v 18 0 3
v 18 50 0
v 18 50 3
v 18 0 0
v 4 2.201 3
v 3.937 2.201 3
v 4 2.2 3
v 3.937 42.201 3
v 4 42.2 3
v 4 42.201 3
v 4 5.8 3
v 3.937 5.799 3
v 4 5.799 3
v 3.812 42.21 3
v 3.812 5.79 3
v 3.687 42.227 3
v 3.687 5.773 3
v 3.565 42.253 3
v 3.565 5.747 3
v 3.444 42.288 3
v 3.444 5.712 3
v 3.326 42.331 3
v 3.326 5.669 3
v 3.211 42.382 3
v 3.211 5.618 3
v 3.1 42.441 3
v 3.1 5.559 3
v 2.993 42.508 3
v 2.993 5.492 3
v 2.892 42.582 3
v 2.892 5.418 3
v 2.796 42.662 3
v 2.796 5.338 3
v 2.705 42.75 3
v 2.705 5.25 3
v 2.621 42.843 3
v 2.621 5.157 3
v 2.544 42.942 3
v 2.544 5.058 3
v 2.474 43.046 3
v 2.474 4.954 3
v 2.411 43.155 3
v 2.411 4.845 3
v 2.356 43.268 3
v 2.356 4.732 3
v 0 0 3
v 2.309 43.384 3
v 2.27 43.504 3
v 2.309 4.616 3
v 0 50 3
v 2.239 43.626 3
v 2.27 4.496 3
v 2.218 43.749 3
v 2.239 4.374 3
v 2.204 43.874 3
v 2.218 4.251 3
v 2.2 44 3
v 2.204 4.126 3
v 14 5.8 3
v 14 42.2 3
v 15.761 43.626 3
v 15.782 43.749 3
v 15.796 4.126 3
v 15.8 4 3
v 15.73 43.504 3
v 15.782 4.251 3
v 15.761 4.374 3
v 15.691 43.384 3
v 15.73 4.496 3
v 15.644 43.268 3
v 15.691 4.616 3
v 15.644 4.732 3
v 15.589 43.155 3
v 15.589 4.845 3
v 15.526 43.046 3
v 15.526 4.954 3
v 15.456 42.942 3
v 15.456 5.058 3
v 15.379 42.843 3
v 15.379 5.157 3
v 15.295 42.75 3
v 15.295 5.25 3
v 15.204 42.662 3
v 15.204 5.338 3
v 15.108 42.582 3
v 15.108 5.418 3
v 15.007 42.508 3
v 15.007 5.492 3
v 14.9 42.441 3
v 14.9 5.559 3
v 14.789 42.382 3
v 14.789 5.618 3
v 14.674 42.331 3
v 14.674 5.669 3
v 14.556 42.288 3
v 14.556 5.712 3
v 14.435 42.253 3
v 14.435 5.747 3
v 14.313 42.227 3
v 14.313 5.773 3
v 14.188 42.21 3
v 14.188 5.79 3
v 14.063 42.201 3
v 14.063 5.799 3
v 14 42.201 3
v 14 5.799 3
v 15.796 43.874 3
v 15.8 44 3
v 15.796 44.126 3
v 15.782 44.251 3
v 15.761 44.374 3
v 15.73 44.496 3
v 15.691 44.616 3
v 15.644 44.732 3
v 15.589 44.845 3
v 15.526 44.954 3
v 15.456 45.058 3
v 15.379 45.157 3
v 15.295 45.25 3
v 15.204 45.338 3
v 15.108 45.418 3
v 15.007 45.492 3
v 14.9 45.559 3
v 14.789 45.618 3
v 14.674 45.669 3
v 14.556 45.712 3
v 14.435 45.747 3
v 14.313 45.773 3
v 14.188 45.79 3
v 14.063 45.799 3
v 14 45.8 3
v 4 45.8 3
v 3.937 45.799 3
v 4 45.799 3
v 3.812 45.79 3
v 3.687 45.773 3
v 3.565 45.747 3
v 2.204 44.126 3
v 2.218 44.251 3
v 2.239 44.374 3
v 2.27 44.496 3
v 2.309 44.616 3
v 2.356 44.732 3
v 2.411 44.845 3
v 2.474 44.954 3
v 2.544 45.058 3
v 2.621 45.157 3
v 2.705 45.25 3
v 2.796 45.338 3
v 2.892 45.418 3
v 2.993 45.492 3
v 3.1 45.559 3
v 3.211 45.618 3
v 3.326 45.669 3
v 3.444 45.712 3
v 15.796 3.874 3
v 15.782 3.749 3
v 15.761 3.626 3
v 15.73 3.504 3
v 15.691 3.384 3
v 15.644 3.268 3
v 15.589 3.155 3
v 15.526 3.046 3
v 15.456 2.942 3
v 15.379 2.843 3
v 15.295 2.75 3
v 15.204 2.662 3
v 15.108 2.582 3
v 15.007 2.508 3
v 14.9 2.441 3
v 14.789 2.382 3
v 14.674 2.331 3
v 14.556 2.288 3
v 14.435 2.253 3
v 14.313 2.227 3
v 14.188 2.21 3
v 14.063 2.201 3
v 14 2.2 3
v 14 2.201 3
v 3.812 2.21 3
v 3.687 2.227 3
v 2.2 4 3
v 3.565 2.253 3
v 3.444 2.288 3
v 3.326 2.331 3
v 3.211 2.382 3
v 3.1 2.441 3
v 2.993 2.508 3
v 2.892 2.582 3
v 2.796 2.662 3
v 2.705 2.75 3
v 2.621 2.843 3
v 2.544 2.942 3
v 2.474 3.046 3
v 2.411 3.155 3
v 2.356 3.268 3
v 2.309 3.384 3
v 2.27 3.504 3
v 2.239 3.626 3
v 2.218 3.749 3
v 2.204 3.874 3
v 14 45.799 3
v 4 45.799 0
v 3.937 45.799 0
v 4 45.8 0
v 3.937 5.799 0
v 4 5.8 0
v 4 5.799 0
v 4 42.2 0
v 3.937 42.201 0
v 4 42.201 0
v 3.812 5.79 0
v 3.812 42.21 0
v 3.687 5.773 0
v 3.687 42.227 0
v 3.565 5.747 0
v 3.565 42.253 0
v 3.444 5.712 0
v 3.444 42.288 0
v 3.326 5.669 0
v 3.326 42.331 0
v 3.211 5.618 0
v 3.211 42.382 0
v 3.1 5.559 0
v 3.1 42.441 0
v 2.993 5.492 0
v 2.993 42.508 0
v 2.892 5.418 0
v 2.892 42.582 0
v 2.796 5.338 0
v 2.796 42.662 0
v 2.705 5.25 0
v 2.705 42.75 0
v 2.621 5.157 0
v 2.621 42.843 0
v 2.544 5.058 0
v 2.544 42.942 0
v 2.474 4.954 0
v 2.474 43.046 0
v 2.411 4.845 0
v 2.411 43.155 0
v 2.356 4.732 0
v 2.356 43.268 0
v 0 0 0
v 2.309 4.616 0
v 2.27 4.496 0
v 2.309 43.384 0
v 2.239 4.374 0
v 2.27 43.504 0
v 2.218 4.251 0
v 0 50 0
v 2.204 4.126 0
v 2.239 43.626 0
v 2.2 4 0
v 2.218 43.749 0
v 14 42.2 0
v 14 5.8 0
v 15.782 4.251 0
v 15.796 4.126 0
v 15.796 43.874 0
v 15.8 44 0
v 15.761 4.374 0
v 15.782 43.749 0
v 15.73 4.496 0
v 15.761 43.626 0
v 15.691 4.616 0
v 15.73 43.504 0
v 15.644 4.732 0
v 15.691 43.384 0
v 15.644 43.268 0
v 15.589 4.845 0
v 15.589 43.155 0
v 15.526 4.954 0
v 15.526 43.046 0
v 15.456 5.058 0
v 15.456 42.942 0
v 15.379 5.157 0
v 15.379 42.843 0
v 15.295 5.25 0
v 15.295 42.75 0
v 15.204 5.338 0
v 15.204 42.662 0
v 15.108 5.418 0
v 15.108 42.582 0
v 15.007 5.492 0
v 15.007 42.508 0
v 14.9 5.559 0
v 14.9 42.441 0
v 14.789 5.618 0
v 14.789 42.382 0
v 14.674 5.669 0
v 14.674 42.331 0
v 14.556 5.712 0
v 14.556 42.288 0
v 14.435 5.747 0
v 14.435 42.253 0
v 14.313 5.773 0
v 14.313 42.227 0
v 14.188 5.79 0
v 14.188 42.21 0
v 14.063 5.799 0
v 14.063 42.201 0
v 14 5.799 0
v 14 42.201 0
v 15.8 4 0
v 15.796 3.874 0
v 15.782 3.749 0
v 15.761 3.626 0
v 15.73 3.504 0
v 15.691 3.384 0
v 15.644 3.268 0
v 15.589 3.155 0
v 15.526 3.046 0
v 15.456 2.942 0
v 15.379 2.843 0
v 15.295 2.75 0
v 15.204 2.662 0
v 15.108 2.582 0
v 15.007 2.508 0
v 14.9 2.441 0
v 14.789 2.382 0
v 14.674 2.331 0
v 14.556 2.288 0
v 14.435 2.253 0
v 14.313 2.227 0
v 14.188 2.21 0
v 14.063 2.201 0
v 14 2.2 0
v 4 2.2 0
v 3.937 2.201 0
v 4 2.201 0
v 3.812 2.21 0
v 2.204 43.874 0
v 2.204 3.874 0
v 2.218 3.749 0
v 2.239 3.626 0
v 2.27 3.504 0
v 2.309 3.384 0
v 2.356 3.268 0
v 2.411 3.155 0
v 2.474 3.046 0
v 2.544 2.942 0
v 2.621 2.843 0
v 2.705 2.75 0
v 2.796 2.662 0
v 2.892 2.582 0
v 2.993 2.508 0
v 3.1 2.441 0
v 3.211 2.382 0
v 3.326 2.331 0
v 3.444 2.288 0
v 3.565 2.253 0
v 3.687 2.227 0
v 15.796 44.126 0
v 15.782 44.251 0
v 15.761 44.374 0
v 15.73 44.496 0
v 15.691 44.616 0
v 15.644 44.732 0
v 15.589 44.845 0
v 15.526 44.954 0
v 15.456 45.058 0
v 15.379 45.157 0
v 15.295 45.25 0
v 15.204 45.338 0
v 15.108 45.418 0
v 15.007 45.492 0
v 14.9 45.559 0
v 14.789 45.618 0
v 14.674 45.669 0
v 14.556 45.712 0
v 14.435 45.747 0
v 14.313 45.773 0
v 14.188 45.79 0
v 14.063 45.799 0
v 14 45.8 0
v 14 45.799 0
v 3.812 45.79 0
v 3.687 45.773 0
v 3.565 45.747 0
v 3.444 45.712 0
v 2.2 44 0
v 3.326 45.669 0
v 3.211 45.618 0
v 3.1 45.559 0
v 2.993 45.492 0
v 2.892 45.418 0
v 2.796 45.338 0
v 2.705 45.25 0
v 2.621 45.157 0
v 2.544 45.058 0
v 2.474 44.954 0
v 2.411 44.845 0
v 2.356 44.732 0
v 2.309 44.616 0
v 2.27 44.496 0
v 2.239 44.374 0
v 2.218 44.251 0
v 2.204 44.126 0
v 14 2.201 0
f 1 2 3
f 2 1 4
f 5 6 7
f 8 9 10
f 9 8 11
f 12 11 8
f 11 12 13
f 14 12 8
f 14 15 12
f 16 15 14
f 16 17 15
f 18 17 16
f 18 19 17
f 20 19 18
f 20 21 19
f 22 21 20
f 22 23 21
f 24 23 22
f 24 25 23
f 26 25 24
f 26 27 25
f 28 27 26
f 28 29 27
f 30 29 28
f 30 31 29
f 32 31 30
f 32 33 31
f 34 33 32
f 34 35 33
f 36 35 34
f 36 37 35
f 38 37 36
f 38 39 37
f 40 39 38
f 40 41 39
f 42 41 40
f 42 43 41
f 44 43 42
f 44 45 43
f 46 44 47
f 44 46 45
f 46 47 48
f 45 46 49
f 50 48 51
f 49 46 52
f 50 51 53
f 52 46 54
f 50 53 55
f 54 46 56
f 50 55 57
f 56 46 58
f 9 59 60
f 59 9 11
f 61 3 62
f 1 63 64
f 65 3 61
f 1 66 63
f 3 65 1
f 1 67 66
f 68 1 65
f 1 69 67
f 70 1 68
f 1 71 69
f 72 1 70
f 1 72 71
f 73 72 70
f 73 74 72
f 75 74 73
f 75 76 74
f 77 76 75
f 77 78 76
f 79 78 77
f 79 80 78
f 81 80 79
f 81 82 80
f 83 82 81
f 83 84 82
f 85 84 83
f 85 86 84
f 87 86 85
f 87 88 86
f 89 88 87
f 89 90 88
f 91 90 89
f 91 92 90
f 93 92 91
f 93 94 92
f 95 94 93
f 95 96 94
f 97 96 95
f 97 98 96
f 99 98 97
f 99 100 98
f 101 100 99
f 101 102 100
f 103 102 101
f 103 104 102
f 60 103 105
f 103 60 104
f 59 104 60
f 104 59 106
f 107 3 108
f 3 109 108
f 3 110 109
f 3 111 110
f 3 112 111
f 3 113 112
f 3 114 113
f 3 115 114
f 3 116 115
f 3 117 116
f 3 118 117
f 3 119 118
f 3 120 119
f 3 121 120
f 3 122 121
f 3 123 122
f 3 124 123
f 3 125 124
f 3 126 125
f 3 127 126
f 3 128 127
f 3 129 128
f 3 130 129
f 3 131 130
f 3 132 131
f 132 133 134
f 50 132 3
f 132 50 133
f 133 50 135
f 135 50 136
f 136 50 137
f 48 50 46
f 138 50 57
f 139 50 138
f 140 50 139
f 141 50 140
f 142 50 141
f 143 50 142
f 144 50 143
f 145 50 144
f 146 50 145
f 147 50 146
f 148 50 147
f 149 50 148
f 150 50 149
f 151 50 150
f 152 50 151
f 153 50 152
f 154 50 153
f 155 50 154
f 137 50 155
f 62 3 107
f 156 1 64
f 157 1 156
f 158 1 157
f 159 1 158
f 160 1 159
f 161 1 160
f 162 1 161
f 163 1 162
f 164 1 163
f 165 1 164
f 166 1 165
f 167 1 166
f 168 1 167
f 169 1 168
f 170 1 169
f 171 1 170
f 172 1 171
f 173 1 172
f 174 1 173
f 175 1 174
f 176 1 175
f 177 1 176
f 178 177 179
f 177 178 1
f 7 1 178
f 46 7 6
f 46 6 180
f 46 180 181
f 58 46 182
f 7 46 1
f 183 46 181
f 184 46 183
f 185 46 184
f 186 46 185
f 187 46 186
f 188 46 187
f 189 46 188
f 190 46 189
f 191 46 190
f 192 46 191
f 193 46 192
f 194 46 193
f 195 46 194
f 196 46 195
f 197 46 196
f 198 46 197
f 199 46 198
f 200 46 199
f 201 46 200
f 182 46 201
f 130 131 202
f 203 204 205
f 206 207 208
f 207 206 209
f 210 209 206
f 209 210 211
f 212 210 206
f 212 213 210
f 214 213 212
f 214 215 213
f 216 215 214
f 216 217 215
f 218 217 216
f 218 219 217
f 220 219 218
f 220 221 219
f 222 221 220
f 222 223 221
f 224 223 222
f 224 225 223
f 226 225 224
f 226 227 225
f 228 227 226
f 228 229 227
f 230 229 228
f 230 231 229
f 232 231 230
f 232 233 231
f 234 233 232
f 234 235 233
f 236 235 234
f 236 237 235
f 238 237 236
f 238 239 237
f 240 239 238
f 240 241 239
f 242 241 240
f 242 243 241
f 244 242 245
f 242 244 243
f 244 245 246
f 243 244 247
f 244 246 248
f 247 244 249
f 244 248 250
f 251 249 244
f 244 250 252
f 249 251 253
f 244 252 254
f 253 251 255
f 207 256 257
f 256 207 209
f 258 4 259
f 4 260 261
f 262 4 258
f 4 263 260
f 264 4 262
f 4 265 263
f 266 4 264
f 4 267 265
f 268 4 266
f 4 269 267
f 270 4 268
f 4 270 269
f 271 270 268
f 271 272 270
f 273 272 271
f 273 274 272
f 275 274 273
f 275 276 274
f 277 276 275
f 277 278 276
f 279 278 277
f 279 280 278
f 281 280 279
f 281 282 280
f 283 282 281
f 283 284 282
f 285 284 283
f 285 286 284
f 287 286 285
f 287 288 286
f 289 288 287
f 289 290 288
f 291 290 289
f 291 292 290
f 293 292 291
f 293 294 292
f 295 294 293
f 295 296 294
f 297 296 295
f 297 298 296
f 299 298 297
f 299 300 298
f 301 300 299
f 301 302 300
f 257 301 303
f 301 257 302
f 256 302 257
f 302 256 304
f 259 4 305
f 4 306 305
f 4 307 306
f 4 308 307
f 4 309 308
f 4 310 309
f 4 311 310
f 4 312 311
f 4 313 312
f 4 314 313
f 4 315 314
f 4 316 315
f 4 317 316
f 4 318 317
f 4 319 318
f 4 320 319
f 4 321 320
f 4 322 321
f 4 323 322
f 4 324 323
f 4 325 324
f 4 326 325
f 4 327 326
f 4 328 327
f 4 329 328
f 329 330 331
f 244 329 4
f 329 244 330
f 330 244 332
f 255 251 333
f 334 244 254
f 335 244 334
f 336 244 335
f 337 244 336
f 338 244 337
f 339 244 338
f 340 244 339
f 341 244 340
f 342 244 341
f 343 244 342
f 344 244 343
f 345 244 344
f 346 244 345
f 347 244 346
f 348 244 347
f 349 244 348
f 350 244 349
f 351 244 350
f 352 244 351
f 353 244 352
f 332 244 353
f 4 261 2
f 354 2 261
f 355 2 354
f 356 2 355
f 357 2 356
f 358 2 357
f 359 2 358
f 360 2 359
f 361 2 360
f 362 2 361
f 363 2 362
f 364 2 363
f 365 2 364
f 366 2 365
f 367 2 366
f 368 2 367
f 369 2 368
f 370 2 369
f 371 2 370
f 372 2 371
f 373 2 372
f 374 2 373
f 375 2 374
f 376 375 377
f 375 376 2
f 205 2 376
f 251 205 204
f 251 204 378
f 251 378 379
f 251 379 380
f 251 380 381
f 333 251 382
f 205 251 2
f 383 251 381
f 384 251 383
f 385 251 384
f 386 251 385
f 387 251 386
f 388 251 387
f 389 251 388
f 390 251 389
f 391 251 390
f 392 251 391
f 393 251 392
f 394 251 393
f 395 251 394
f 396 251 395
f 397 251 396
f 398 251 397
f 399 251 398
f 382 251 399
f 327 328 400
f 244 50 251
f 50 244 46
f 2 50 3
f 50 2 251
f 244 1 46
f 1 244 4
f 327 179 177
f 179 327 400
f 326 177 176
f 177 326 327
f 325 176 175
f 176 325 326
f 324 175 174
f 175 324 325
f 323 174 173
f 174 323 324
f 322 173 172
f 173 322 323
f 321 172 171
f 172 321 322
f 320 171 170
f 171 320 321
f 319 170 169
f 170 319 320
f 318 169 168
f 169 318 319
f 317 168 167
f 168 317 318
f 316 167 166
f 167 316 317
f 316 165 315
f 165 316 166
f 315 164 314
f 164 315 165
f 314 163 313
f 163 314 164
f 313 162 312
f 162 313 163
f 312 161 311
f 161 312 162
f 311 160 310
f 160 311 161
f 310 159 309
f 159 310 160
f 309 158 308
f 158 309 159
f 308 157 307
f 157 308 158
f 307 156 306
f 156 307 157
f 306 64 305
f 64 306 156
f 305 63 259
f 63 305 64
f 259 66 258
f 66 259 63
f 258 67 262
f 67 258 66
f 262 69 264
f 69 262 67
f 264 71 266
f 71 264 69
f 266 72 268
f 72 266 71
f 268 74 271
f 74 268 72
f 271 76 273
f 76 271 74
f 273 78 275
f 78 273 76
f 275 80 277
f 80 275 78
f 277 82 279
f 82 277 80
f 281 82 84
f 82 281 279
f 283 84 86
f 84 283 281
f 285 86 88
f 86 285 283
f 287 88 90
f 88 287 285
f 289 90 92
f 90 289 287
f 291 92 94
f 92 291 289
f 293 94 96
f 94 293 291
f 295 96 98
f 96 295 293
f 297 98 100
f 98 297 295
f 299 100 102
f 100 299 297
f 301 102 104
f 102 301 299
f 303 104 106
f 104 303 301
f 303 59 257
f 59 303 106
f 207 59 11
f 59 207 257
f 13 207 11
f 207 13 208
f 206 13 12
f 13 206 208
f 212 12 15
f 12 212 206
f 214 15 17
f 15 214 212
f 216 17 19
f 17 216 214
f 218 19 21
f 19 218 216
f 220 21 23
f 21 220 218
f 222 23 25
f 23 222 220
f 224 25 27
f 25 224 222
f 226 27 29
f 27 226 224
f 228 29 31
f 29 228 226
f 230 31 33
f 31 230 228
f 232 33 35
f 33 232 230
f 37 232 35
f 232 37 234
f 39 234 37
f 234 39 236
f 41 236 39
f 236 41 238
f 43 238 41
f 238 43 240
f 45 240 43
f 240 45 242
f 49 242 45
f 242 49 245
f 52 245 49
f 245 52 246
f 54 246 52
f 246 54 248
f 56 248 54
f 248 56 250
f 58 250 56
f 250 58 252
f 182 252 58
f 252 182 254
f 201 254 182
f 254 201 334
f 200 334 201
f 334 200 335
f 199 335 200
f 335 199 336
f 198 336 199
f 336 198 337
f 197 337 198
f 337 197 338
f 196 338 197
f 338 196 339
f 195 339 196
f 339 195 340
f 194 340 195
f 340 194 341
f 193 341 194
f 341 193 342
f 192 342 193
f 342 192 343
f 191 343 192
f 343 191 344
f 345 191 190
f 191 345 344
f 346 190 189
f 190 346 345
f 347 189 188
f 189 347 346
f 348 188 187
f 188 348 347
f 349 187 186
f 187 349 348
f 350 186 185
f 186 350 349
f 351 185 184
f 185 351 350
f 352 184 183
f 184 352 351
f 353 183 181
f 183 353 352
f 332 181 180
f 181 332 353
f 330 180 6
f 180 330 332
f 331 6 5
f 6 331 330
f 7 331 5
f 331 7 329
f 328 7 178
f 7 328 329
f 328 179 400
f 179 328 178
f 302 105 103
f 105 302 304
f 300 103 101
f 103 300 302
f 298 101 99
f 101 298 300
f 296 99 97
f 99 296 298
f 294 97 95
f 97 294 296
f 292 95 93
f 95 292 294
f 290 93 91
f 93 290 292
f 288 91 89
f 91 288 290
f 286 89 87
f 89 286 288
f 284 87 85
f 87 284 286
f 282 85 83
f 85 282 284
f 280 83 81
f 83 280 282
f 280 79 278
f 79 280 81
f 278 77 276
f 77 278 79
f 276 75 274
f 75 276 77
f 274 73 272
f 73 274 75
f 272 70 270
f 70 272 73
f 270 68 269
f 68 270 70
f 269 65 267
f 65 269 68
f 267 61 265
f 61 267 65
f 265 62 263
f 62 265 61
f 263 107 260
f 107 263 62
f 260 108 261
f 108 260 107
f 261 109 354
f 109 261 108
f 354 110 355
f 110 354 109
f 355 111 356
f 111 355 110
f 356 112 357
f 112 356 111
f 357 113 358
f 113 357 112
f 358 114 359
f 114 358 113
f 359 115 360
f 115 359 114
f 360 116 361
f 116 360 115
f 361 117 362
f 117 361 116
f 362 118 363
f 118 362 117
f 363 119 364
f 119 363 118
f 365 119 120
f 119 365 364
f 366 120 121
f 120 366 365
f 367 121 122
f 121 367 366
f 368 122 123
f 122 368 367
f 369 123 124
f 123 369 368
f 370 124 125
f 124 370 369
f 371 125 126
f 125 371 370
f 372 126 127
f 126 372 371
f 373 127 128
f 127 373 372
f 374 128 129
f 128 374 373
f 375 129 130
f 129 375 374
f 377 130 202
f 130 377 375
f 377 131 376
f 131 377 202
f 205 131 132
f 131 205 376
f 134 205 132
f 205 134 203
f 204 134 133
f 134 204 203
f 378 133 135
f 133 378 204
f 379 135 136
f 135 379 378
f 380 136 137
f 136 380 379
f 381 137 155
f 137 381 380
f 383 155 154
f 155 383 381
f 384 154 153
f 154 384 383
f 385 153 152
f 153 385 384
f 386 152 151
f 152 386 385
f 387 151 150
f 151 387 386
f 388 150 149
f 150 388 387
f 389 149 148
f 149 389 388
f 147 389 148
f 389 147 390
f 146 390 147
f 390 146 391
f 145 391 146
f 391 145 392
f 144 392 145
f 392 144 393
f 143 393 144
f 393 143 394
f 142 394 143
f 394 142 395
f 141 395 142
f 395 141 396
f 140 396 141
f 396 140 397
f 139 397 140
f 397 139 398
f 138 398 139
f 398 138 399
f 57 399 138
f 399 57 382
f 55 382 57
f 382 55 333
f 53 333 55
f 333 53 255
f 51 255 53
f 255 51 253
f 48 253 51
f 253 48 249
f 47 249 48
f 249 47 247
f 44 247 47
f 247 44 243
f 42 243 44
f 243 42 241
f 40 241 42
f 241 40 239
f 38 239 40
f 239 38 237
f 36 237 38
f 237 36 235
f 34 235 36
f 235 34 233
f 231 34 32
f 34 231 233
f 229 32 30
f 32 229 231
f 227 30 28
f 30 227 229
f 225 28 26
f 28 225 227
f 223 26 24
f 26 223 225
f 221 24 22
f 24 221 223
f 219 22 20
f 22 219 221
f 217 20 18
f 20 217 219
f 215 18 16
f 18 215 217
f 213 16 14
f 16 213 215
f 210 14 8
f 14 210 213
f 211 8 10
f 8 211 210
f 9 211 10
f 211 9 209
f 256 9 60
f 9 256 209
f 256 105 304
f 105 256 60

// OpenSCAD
// file: parameters.scad
// Screw threads.
// Note that the depth is increased by 0.1 mm as compared
// to the data sheet.
// The diameter corresponds to the d3 from the data sheet,
// and the depth correponds to the L.

// M2
g_M2_thread_diameter = 3.2;
g_M2_thread_depth    = 4.1;

// M3
g_M3_thread_diameter = 4.0;
g_M3_thread_depth    = 5.8;

// Through holes.
// See for instance https://de.wikipedia.org/wiki/Durchgangsbohrung
g_M2_through_hole_diameter = 2.4;
g_M3_through_hole_diameter = 3.4;
g_M3_through_hole_diameter_large = 3.6;

// Offset between holes in stencil mount
stencil_mount_hole_offset = 40.0;
// main file
// Stencil mount

// This part is used to fixate the stencil on the PCB mount.
// To be printed twice.

include <parameters.scad>

function get_fn(detailed) = detailed ? 90 : 24;
g_detailed = true;
g_fn = get_fn(g_detailed);

// wall_thickness_mount + stencil_space
stencil_width = 11+7;

stencil_height = 3.0;
stencil_length = 50.0;


// L: Length of the Langloch
// h: its height
module langloch(L, h) {
    r = 0.5*g_M3_through_hole_diameter_large;
    linear_extrude(h, center=false) {
        circle(d = g_M3_through_hole_diameter_large, $fn=g_fn);
        translate([L,0,0])
            circle(d = g_M3_through_hole_diameter_large, $fn=g_fn);
        polygon([[0,-r], [L, -r], [L, r], [0, r]]);
    }
}


module stencil_mount() {
    difference() {
        cube([stencil_width, stencil_length, stencil_height]);
        translate([4,4,0])
            langloch(18-2*4, stencil_height);
        translate([4, 4+stencil_mount_hole_offset, 0])
            langloch(18-2*4, stencil_height);
    }
    
}

stencil_mount();
